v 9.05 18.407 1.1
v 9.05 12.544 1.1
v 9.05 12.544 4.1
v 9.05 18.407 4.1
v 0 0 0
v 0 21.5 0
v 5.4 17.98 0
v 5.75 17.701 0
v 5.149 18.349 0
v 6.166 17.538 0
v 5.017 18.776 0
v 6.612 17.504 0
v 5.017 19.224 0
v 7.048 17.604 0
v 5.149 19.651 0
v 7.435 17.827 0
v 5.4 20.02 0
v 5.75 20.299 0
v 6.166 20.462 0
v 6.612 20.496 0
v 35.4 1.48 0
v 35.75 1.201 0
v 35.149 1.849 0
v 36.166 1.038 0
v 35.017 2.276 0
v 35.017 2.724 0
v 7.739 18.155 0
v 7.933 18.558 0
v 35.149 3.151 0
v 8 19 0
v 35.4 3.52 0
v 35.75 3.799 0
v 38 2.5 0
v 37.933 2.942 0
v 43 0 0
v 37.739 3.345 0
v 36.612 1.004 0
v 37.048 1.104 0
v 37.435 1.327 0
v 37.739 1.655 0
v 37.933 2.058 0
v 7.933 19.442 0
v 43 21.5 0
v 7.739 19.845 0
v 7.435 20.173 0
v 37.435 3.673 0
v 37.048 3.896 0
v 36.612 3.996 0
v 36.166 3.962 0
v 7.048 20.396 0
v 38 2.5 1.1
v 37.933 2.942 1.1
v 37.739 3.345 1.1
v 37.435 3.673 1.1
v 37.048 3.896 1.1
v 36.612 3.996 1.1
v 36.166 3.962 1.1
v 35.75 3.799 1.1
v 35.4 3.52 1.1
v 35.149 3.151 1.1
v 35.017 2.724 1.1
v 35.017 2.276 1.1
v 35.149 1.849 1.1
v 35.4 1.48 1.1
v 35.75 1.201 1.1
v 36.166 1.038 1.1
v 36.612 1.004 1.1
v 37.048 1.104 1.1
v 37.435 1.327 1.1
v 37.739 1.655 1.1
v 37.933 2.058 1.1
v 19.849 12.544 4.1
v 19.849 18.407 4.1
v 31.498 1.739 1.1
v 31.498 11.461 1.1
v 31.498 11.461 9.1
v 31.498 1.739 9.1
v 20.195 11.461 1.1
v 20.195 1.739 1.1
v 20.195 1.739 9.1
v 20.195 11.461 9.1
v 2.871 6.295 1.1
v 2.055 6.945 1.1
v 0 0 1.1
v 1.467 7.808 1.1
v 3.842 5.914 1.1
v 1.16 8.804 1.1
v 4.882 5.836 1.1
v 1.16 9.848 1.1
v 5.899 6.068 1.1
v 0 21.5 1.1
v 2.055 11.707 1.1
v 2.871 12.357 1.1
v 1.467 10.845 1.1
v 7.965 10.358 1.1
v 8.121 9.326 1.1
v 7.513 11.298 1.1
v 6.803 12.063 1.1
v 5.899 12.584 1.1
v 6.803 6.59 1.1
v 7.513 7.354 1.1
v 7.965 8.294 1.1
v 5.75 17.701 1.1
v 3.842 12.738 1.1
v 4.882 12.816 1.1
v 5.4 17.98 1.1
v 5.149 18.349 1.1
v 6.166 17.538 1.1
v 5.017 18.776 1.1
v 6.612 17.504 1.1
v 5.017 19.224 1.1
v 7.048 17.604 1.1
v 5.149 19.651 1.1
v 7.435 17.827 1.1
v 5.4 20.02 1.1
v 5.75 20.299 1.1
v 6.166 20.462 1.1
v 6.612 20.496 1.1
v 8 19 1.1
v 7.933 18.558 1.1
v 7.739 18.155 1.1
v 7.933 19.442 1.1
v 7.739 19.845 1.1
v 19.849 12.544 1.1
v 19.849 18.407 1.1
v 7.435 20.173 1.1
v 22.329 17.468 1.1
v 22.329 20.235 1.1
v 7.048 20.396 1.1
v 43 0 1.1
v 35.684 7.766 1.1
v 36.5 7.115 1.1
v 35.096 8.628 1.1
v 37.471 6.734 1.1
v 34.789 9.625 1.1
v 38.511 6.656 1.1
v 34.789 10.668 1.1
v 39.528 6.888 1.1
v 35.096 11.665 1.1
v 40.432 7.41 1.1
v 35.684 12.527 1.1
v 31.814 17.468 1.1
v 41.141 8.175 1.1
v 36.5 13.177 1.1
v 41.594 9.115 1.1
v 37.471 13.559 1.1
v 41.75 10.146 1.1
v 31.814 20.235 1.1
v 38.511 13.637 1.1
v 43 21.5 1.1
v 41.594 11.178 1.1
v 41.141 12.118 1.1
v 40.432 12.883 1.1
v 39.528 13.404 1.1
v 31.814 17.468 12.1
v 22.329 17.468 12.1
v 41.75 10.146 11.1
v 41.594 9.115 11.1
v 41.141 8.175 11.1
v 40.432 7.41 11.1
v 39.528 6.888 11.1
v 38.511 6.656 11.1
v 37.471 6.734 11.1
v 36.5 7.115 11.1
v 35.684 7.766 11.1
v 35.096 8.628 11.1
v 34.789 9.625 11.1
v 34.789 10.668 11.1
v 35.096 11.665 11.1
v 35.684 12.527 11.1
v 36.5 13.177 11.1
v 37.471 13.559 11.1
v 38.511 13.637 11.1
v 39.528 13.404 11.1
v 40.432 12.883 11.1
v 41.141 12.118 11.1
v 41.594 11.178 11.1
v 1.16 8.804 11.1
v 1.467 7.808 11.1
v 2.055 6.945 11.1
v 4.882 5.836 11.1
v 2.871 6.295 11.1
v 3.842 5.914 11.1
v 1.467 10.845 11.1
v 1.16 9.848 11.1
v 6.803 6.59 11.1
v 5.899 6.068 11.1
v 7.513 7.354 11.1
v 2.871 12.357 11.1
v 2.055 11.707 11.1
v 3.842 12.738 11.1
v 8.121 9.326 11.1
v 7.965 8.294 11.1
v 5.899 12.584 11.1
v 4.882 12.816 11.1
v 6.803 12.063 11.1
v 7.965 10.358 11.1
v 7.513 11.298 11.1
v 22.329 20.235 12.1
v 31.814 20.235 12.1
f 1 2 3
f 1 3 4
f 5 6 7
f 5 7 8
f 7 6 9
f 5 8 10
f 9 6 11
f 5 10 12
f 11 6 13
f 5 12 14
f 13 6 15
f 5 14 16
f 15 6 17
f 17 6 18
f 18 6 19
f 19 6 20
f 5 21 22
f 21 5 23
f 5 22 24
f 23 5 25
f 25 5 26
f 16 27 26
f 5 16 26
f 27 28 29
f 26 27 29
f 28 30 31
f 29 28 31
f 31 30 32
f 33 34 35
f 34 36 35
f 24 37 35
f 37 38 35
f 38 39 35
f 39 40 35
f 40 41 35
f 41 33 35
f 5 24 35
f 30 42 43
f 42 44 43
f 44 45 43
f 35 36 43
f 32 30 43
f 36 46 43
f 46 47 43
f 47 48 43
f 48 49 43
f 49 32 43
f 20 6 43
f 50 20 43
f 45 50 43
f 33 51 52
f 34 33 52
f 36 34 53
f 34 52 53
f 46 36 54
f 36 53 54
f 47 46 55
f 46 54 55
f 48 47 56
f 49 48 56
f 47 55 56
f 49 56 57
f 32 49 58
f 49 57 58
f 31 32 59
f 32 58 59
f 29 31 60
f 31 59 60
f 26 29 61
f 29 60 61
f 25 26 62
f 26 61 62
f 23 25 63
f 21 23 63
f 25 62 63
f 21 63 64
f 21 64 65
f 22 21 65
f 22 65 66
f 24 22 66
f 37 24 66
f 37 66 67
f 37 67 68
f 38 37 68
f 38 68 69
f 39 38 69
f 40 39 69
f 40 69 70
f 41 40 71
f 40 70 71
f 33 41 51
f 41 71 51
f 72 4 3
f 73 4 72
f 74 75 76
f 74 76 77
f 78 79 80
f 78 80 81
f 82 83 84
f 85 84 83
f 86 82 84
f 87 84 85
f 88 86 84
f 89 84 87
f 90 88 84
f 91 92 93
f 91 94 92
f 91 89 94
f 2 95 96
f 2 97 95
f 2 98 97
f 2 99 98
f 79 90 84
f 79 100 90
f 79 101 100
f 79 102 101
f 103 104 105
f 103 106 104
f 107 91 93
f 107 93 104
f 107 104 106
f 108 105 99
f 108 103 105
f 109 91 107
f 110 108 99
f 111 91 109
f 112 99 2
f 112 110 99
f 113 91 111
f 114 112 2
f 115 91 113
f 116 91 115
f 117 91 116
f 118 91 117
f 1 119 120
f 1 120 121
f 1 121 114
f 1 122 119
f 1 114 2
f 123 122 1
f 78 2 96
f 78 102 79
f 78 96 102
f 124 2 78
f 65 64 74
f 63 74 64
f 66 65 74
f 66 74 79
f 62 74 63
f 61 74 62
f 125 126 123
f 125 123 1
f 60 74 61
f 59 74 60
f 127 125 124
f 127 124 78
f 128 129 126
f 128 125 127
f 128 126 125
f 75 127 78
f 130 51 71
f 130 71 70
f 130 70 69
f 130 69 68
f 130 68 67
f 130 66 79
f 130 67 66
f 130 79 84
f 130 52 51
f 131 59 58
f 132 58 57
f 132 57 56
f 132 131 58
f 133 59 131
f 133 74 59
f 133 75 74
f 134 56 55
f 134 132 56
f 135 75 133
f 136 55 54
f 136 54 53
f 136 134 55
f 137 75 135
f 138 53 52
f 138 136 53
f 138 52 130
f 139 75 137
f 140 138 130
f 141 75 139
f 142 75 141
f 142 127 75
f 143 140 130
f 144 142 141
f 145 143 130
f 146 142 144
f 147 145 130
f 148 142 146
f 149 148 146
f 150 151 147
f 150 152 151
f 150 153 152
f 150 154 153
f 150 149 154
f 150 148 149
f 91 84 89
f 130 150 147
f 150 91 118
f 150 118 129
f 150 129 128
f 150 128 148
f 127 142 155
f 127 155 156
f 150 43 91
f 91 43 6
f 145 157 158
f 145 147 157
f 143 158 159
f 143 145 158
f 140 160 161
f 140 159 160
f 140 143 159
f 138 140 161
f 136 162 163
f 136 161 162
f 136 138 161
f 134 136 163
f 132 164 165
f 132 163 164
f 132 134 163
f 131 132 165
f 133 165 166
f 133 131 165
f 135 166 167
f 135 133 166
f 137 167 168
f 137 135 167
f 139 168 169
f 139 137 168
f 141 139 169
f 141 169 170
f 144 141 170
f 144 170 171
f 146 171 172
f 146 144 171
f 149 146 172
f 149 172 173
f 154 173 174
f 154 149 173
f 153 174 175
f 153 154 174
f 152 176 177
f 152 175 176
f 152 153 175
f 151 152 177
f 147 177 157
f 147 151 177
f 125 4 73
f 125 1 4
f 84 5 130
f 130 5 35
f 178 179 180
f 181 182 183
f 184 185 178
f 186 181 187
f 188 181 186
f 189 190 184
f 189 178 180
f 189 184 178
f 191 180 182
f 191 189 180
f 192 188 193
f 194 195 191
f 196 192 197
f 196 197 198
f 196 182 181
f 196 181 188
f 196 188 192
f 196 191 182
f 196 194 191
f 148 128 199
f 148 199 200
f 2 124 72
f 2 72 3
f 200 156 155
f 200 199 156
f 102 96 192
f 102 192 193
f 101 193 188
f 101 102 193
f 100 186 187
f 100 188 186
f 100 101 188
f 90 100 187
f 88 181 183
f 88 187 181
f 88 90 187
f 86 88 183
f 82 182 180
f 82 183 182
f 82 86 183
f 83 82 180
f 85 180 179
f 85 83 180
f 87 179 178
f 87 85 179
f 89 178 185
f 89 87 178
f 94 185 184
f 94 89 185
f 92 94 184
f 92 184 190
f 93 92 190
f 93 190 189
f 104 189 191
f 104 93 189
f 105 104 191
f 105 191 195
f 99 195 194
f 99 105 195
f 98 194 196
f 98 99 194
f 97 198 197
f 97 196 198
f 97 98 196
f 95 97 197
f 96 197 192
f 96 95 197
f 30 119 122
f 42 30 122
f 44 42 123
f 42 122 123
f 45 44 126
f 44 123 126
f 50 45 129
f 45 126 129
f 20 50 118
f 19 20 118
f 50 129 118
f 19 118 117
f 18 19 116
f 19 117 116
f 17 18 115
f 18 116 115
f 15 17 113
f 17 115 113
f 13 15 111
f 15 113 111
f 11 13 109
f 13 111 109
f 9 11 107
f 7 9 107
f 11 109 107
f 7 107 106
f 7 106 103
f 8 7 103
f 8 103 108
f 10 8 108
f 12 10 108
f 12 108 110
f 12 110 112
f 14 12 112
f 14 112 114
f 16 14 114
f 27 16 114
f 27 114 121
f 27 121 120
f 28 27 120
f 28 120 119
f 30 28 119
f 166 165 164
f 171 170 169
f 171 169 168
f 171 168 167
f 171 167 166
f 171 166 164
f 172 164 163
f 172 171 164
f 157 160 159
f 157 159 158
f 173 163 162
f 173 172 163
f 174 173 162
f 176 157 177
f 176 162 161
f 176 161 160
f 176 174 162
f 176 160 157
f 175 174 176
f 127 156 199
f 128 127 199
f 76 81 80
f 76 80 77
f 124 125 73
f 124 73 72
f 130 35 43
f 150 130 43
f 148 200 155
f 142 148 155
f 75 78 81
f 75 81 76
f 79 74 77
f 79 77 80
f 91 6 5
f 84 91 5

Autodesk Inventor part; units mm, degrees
ref_plane "YZ Plane" through (0, 0, 0) normal (1, 0, 0) x (0, 1, 0)
ref_plane "XZ Plane" through (0, 0, 0) normal (0, 1, 0) x (-1, 0, 0)
ref_plane "XY Plane" through (0, 0, 0) normal (0, 0, 1) x (1, 0, 0)
sketch "Sketch1" plane through (0, 0, 0) normal (0, 0, 1) x (1, 0, 0)
  line L0 (0, 0) -> (43, 0)
  line L1 (43, 0) -> (43, 21.5)
  line L2 (43, 21.5) -> (0, 21.5)
  line L3 (0, 21.5) -> (0, 0)
  dimension "d0" = 43
  dimension "d1" = 21.5
  dimension "d2" = 43
extrude "Extrusion1" add sketch "Sketch1" along normal blind 1.1
sketch "Sketch2" plane through (0, 0, 1.1) normal (0, 0, 1) x (1, 0, 0)
  line L0 (43, 21.5) -> (0, 21.5) projected
  line L1 (0, 21.5) -> (6.5, 21.5)
  line L2 (6.5, 21.5) -> (6.5, 19)
  circle A0 centre (6.5, 19) radius 1.5
  line L3 (0, 0) -> (43, 0) projected
  line L4 (43, 0) -> (36.5, 0)
  line L5 (36.5, 0) -> (36.5, 2.5)
  circle A1 centre (36.5, 2.5) radius 1.5
  dimension "d5" = 6.5
  dimension "d6" = 2.5
  dimension "d7" = 3
  dimension "d8" = 6.5
  dimension "d9" = 2.5
  dimension "d10" = 3
extrude "Extrusion2" cut sketch "Sketch2" against normal blind 1.1
sketch "Sketch3" plane through (0, 0, 1.1) normal (0, 0, 1) x (1, 0, 0)
  circle A0 centre (4.6207, 9.3261) radius 3.5
  circle A1 centre (38.2496, 10.1463) radius 3.5
  point P0 (0, 0)
  dimension "d13" = 7
  dimension "d14" = 7
extrude "Extrusion3" add sketch "Sketch3" along normal blind 10
sketch "Sketch4" plane through (0, 0, 1.1) normal (0, 0, 1) x (1, 0, 0)
  line L0 (31.8145, 20.2348) -> (31.8145, 17.4683)
  line L1 (31.8145, 17.4683) -> (22.3294, 17.4683)
  line L2 (22.3294, 17.4683) -> (22.3294, 20.2348)
  line L3 (22.3294, 20.2348) -> (31.8145, 20.2348)
  point P0 (0, 0)
extrude "Extrusion4" add sketch "Sketch4" along normal blind 11
sketch "Sketch5" plane through (0, 0, 1.1) normal (0, 0, 1) x (1, 0, 0)
  line L0 (31.4983, 11.4611) -> (31.4983, 1.7389)
  line L1 (31.4983, 1.7389) -> (20.1953, 1.7389)
  line L2 (20.1953, 1.7389) -> (20.1953, 11.4611)
  line L3 (20.1953, 11.4611) -> (31.4983, 11.4611)
  point P0 (0, 0)
extrude "Extrusion5" add sketch "Sketch5" along normal blind 8
sketch "Sketch6" plane through (0, 0, 1.1) normal (0, 0, 1) x (1, 0, 0)
  line L0 (9.0495, 18.4071) -> (19.8493, 18.4071)
  line L1 (19.8493, 18.4071) -> (19.8493, 12.5444)
  line L2 (19.8493, 12.5444) -> (9.0495, 12.5444)
  line L3 (9.0495, 12.5444) -> (9.0495, 18.4071)
  point P0 (0, 0)
extrude "Extrusion6" add sketch "Sketch6" along normal blind 3
properties part number "VoltageRegulator"
